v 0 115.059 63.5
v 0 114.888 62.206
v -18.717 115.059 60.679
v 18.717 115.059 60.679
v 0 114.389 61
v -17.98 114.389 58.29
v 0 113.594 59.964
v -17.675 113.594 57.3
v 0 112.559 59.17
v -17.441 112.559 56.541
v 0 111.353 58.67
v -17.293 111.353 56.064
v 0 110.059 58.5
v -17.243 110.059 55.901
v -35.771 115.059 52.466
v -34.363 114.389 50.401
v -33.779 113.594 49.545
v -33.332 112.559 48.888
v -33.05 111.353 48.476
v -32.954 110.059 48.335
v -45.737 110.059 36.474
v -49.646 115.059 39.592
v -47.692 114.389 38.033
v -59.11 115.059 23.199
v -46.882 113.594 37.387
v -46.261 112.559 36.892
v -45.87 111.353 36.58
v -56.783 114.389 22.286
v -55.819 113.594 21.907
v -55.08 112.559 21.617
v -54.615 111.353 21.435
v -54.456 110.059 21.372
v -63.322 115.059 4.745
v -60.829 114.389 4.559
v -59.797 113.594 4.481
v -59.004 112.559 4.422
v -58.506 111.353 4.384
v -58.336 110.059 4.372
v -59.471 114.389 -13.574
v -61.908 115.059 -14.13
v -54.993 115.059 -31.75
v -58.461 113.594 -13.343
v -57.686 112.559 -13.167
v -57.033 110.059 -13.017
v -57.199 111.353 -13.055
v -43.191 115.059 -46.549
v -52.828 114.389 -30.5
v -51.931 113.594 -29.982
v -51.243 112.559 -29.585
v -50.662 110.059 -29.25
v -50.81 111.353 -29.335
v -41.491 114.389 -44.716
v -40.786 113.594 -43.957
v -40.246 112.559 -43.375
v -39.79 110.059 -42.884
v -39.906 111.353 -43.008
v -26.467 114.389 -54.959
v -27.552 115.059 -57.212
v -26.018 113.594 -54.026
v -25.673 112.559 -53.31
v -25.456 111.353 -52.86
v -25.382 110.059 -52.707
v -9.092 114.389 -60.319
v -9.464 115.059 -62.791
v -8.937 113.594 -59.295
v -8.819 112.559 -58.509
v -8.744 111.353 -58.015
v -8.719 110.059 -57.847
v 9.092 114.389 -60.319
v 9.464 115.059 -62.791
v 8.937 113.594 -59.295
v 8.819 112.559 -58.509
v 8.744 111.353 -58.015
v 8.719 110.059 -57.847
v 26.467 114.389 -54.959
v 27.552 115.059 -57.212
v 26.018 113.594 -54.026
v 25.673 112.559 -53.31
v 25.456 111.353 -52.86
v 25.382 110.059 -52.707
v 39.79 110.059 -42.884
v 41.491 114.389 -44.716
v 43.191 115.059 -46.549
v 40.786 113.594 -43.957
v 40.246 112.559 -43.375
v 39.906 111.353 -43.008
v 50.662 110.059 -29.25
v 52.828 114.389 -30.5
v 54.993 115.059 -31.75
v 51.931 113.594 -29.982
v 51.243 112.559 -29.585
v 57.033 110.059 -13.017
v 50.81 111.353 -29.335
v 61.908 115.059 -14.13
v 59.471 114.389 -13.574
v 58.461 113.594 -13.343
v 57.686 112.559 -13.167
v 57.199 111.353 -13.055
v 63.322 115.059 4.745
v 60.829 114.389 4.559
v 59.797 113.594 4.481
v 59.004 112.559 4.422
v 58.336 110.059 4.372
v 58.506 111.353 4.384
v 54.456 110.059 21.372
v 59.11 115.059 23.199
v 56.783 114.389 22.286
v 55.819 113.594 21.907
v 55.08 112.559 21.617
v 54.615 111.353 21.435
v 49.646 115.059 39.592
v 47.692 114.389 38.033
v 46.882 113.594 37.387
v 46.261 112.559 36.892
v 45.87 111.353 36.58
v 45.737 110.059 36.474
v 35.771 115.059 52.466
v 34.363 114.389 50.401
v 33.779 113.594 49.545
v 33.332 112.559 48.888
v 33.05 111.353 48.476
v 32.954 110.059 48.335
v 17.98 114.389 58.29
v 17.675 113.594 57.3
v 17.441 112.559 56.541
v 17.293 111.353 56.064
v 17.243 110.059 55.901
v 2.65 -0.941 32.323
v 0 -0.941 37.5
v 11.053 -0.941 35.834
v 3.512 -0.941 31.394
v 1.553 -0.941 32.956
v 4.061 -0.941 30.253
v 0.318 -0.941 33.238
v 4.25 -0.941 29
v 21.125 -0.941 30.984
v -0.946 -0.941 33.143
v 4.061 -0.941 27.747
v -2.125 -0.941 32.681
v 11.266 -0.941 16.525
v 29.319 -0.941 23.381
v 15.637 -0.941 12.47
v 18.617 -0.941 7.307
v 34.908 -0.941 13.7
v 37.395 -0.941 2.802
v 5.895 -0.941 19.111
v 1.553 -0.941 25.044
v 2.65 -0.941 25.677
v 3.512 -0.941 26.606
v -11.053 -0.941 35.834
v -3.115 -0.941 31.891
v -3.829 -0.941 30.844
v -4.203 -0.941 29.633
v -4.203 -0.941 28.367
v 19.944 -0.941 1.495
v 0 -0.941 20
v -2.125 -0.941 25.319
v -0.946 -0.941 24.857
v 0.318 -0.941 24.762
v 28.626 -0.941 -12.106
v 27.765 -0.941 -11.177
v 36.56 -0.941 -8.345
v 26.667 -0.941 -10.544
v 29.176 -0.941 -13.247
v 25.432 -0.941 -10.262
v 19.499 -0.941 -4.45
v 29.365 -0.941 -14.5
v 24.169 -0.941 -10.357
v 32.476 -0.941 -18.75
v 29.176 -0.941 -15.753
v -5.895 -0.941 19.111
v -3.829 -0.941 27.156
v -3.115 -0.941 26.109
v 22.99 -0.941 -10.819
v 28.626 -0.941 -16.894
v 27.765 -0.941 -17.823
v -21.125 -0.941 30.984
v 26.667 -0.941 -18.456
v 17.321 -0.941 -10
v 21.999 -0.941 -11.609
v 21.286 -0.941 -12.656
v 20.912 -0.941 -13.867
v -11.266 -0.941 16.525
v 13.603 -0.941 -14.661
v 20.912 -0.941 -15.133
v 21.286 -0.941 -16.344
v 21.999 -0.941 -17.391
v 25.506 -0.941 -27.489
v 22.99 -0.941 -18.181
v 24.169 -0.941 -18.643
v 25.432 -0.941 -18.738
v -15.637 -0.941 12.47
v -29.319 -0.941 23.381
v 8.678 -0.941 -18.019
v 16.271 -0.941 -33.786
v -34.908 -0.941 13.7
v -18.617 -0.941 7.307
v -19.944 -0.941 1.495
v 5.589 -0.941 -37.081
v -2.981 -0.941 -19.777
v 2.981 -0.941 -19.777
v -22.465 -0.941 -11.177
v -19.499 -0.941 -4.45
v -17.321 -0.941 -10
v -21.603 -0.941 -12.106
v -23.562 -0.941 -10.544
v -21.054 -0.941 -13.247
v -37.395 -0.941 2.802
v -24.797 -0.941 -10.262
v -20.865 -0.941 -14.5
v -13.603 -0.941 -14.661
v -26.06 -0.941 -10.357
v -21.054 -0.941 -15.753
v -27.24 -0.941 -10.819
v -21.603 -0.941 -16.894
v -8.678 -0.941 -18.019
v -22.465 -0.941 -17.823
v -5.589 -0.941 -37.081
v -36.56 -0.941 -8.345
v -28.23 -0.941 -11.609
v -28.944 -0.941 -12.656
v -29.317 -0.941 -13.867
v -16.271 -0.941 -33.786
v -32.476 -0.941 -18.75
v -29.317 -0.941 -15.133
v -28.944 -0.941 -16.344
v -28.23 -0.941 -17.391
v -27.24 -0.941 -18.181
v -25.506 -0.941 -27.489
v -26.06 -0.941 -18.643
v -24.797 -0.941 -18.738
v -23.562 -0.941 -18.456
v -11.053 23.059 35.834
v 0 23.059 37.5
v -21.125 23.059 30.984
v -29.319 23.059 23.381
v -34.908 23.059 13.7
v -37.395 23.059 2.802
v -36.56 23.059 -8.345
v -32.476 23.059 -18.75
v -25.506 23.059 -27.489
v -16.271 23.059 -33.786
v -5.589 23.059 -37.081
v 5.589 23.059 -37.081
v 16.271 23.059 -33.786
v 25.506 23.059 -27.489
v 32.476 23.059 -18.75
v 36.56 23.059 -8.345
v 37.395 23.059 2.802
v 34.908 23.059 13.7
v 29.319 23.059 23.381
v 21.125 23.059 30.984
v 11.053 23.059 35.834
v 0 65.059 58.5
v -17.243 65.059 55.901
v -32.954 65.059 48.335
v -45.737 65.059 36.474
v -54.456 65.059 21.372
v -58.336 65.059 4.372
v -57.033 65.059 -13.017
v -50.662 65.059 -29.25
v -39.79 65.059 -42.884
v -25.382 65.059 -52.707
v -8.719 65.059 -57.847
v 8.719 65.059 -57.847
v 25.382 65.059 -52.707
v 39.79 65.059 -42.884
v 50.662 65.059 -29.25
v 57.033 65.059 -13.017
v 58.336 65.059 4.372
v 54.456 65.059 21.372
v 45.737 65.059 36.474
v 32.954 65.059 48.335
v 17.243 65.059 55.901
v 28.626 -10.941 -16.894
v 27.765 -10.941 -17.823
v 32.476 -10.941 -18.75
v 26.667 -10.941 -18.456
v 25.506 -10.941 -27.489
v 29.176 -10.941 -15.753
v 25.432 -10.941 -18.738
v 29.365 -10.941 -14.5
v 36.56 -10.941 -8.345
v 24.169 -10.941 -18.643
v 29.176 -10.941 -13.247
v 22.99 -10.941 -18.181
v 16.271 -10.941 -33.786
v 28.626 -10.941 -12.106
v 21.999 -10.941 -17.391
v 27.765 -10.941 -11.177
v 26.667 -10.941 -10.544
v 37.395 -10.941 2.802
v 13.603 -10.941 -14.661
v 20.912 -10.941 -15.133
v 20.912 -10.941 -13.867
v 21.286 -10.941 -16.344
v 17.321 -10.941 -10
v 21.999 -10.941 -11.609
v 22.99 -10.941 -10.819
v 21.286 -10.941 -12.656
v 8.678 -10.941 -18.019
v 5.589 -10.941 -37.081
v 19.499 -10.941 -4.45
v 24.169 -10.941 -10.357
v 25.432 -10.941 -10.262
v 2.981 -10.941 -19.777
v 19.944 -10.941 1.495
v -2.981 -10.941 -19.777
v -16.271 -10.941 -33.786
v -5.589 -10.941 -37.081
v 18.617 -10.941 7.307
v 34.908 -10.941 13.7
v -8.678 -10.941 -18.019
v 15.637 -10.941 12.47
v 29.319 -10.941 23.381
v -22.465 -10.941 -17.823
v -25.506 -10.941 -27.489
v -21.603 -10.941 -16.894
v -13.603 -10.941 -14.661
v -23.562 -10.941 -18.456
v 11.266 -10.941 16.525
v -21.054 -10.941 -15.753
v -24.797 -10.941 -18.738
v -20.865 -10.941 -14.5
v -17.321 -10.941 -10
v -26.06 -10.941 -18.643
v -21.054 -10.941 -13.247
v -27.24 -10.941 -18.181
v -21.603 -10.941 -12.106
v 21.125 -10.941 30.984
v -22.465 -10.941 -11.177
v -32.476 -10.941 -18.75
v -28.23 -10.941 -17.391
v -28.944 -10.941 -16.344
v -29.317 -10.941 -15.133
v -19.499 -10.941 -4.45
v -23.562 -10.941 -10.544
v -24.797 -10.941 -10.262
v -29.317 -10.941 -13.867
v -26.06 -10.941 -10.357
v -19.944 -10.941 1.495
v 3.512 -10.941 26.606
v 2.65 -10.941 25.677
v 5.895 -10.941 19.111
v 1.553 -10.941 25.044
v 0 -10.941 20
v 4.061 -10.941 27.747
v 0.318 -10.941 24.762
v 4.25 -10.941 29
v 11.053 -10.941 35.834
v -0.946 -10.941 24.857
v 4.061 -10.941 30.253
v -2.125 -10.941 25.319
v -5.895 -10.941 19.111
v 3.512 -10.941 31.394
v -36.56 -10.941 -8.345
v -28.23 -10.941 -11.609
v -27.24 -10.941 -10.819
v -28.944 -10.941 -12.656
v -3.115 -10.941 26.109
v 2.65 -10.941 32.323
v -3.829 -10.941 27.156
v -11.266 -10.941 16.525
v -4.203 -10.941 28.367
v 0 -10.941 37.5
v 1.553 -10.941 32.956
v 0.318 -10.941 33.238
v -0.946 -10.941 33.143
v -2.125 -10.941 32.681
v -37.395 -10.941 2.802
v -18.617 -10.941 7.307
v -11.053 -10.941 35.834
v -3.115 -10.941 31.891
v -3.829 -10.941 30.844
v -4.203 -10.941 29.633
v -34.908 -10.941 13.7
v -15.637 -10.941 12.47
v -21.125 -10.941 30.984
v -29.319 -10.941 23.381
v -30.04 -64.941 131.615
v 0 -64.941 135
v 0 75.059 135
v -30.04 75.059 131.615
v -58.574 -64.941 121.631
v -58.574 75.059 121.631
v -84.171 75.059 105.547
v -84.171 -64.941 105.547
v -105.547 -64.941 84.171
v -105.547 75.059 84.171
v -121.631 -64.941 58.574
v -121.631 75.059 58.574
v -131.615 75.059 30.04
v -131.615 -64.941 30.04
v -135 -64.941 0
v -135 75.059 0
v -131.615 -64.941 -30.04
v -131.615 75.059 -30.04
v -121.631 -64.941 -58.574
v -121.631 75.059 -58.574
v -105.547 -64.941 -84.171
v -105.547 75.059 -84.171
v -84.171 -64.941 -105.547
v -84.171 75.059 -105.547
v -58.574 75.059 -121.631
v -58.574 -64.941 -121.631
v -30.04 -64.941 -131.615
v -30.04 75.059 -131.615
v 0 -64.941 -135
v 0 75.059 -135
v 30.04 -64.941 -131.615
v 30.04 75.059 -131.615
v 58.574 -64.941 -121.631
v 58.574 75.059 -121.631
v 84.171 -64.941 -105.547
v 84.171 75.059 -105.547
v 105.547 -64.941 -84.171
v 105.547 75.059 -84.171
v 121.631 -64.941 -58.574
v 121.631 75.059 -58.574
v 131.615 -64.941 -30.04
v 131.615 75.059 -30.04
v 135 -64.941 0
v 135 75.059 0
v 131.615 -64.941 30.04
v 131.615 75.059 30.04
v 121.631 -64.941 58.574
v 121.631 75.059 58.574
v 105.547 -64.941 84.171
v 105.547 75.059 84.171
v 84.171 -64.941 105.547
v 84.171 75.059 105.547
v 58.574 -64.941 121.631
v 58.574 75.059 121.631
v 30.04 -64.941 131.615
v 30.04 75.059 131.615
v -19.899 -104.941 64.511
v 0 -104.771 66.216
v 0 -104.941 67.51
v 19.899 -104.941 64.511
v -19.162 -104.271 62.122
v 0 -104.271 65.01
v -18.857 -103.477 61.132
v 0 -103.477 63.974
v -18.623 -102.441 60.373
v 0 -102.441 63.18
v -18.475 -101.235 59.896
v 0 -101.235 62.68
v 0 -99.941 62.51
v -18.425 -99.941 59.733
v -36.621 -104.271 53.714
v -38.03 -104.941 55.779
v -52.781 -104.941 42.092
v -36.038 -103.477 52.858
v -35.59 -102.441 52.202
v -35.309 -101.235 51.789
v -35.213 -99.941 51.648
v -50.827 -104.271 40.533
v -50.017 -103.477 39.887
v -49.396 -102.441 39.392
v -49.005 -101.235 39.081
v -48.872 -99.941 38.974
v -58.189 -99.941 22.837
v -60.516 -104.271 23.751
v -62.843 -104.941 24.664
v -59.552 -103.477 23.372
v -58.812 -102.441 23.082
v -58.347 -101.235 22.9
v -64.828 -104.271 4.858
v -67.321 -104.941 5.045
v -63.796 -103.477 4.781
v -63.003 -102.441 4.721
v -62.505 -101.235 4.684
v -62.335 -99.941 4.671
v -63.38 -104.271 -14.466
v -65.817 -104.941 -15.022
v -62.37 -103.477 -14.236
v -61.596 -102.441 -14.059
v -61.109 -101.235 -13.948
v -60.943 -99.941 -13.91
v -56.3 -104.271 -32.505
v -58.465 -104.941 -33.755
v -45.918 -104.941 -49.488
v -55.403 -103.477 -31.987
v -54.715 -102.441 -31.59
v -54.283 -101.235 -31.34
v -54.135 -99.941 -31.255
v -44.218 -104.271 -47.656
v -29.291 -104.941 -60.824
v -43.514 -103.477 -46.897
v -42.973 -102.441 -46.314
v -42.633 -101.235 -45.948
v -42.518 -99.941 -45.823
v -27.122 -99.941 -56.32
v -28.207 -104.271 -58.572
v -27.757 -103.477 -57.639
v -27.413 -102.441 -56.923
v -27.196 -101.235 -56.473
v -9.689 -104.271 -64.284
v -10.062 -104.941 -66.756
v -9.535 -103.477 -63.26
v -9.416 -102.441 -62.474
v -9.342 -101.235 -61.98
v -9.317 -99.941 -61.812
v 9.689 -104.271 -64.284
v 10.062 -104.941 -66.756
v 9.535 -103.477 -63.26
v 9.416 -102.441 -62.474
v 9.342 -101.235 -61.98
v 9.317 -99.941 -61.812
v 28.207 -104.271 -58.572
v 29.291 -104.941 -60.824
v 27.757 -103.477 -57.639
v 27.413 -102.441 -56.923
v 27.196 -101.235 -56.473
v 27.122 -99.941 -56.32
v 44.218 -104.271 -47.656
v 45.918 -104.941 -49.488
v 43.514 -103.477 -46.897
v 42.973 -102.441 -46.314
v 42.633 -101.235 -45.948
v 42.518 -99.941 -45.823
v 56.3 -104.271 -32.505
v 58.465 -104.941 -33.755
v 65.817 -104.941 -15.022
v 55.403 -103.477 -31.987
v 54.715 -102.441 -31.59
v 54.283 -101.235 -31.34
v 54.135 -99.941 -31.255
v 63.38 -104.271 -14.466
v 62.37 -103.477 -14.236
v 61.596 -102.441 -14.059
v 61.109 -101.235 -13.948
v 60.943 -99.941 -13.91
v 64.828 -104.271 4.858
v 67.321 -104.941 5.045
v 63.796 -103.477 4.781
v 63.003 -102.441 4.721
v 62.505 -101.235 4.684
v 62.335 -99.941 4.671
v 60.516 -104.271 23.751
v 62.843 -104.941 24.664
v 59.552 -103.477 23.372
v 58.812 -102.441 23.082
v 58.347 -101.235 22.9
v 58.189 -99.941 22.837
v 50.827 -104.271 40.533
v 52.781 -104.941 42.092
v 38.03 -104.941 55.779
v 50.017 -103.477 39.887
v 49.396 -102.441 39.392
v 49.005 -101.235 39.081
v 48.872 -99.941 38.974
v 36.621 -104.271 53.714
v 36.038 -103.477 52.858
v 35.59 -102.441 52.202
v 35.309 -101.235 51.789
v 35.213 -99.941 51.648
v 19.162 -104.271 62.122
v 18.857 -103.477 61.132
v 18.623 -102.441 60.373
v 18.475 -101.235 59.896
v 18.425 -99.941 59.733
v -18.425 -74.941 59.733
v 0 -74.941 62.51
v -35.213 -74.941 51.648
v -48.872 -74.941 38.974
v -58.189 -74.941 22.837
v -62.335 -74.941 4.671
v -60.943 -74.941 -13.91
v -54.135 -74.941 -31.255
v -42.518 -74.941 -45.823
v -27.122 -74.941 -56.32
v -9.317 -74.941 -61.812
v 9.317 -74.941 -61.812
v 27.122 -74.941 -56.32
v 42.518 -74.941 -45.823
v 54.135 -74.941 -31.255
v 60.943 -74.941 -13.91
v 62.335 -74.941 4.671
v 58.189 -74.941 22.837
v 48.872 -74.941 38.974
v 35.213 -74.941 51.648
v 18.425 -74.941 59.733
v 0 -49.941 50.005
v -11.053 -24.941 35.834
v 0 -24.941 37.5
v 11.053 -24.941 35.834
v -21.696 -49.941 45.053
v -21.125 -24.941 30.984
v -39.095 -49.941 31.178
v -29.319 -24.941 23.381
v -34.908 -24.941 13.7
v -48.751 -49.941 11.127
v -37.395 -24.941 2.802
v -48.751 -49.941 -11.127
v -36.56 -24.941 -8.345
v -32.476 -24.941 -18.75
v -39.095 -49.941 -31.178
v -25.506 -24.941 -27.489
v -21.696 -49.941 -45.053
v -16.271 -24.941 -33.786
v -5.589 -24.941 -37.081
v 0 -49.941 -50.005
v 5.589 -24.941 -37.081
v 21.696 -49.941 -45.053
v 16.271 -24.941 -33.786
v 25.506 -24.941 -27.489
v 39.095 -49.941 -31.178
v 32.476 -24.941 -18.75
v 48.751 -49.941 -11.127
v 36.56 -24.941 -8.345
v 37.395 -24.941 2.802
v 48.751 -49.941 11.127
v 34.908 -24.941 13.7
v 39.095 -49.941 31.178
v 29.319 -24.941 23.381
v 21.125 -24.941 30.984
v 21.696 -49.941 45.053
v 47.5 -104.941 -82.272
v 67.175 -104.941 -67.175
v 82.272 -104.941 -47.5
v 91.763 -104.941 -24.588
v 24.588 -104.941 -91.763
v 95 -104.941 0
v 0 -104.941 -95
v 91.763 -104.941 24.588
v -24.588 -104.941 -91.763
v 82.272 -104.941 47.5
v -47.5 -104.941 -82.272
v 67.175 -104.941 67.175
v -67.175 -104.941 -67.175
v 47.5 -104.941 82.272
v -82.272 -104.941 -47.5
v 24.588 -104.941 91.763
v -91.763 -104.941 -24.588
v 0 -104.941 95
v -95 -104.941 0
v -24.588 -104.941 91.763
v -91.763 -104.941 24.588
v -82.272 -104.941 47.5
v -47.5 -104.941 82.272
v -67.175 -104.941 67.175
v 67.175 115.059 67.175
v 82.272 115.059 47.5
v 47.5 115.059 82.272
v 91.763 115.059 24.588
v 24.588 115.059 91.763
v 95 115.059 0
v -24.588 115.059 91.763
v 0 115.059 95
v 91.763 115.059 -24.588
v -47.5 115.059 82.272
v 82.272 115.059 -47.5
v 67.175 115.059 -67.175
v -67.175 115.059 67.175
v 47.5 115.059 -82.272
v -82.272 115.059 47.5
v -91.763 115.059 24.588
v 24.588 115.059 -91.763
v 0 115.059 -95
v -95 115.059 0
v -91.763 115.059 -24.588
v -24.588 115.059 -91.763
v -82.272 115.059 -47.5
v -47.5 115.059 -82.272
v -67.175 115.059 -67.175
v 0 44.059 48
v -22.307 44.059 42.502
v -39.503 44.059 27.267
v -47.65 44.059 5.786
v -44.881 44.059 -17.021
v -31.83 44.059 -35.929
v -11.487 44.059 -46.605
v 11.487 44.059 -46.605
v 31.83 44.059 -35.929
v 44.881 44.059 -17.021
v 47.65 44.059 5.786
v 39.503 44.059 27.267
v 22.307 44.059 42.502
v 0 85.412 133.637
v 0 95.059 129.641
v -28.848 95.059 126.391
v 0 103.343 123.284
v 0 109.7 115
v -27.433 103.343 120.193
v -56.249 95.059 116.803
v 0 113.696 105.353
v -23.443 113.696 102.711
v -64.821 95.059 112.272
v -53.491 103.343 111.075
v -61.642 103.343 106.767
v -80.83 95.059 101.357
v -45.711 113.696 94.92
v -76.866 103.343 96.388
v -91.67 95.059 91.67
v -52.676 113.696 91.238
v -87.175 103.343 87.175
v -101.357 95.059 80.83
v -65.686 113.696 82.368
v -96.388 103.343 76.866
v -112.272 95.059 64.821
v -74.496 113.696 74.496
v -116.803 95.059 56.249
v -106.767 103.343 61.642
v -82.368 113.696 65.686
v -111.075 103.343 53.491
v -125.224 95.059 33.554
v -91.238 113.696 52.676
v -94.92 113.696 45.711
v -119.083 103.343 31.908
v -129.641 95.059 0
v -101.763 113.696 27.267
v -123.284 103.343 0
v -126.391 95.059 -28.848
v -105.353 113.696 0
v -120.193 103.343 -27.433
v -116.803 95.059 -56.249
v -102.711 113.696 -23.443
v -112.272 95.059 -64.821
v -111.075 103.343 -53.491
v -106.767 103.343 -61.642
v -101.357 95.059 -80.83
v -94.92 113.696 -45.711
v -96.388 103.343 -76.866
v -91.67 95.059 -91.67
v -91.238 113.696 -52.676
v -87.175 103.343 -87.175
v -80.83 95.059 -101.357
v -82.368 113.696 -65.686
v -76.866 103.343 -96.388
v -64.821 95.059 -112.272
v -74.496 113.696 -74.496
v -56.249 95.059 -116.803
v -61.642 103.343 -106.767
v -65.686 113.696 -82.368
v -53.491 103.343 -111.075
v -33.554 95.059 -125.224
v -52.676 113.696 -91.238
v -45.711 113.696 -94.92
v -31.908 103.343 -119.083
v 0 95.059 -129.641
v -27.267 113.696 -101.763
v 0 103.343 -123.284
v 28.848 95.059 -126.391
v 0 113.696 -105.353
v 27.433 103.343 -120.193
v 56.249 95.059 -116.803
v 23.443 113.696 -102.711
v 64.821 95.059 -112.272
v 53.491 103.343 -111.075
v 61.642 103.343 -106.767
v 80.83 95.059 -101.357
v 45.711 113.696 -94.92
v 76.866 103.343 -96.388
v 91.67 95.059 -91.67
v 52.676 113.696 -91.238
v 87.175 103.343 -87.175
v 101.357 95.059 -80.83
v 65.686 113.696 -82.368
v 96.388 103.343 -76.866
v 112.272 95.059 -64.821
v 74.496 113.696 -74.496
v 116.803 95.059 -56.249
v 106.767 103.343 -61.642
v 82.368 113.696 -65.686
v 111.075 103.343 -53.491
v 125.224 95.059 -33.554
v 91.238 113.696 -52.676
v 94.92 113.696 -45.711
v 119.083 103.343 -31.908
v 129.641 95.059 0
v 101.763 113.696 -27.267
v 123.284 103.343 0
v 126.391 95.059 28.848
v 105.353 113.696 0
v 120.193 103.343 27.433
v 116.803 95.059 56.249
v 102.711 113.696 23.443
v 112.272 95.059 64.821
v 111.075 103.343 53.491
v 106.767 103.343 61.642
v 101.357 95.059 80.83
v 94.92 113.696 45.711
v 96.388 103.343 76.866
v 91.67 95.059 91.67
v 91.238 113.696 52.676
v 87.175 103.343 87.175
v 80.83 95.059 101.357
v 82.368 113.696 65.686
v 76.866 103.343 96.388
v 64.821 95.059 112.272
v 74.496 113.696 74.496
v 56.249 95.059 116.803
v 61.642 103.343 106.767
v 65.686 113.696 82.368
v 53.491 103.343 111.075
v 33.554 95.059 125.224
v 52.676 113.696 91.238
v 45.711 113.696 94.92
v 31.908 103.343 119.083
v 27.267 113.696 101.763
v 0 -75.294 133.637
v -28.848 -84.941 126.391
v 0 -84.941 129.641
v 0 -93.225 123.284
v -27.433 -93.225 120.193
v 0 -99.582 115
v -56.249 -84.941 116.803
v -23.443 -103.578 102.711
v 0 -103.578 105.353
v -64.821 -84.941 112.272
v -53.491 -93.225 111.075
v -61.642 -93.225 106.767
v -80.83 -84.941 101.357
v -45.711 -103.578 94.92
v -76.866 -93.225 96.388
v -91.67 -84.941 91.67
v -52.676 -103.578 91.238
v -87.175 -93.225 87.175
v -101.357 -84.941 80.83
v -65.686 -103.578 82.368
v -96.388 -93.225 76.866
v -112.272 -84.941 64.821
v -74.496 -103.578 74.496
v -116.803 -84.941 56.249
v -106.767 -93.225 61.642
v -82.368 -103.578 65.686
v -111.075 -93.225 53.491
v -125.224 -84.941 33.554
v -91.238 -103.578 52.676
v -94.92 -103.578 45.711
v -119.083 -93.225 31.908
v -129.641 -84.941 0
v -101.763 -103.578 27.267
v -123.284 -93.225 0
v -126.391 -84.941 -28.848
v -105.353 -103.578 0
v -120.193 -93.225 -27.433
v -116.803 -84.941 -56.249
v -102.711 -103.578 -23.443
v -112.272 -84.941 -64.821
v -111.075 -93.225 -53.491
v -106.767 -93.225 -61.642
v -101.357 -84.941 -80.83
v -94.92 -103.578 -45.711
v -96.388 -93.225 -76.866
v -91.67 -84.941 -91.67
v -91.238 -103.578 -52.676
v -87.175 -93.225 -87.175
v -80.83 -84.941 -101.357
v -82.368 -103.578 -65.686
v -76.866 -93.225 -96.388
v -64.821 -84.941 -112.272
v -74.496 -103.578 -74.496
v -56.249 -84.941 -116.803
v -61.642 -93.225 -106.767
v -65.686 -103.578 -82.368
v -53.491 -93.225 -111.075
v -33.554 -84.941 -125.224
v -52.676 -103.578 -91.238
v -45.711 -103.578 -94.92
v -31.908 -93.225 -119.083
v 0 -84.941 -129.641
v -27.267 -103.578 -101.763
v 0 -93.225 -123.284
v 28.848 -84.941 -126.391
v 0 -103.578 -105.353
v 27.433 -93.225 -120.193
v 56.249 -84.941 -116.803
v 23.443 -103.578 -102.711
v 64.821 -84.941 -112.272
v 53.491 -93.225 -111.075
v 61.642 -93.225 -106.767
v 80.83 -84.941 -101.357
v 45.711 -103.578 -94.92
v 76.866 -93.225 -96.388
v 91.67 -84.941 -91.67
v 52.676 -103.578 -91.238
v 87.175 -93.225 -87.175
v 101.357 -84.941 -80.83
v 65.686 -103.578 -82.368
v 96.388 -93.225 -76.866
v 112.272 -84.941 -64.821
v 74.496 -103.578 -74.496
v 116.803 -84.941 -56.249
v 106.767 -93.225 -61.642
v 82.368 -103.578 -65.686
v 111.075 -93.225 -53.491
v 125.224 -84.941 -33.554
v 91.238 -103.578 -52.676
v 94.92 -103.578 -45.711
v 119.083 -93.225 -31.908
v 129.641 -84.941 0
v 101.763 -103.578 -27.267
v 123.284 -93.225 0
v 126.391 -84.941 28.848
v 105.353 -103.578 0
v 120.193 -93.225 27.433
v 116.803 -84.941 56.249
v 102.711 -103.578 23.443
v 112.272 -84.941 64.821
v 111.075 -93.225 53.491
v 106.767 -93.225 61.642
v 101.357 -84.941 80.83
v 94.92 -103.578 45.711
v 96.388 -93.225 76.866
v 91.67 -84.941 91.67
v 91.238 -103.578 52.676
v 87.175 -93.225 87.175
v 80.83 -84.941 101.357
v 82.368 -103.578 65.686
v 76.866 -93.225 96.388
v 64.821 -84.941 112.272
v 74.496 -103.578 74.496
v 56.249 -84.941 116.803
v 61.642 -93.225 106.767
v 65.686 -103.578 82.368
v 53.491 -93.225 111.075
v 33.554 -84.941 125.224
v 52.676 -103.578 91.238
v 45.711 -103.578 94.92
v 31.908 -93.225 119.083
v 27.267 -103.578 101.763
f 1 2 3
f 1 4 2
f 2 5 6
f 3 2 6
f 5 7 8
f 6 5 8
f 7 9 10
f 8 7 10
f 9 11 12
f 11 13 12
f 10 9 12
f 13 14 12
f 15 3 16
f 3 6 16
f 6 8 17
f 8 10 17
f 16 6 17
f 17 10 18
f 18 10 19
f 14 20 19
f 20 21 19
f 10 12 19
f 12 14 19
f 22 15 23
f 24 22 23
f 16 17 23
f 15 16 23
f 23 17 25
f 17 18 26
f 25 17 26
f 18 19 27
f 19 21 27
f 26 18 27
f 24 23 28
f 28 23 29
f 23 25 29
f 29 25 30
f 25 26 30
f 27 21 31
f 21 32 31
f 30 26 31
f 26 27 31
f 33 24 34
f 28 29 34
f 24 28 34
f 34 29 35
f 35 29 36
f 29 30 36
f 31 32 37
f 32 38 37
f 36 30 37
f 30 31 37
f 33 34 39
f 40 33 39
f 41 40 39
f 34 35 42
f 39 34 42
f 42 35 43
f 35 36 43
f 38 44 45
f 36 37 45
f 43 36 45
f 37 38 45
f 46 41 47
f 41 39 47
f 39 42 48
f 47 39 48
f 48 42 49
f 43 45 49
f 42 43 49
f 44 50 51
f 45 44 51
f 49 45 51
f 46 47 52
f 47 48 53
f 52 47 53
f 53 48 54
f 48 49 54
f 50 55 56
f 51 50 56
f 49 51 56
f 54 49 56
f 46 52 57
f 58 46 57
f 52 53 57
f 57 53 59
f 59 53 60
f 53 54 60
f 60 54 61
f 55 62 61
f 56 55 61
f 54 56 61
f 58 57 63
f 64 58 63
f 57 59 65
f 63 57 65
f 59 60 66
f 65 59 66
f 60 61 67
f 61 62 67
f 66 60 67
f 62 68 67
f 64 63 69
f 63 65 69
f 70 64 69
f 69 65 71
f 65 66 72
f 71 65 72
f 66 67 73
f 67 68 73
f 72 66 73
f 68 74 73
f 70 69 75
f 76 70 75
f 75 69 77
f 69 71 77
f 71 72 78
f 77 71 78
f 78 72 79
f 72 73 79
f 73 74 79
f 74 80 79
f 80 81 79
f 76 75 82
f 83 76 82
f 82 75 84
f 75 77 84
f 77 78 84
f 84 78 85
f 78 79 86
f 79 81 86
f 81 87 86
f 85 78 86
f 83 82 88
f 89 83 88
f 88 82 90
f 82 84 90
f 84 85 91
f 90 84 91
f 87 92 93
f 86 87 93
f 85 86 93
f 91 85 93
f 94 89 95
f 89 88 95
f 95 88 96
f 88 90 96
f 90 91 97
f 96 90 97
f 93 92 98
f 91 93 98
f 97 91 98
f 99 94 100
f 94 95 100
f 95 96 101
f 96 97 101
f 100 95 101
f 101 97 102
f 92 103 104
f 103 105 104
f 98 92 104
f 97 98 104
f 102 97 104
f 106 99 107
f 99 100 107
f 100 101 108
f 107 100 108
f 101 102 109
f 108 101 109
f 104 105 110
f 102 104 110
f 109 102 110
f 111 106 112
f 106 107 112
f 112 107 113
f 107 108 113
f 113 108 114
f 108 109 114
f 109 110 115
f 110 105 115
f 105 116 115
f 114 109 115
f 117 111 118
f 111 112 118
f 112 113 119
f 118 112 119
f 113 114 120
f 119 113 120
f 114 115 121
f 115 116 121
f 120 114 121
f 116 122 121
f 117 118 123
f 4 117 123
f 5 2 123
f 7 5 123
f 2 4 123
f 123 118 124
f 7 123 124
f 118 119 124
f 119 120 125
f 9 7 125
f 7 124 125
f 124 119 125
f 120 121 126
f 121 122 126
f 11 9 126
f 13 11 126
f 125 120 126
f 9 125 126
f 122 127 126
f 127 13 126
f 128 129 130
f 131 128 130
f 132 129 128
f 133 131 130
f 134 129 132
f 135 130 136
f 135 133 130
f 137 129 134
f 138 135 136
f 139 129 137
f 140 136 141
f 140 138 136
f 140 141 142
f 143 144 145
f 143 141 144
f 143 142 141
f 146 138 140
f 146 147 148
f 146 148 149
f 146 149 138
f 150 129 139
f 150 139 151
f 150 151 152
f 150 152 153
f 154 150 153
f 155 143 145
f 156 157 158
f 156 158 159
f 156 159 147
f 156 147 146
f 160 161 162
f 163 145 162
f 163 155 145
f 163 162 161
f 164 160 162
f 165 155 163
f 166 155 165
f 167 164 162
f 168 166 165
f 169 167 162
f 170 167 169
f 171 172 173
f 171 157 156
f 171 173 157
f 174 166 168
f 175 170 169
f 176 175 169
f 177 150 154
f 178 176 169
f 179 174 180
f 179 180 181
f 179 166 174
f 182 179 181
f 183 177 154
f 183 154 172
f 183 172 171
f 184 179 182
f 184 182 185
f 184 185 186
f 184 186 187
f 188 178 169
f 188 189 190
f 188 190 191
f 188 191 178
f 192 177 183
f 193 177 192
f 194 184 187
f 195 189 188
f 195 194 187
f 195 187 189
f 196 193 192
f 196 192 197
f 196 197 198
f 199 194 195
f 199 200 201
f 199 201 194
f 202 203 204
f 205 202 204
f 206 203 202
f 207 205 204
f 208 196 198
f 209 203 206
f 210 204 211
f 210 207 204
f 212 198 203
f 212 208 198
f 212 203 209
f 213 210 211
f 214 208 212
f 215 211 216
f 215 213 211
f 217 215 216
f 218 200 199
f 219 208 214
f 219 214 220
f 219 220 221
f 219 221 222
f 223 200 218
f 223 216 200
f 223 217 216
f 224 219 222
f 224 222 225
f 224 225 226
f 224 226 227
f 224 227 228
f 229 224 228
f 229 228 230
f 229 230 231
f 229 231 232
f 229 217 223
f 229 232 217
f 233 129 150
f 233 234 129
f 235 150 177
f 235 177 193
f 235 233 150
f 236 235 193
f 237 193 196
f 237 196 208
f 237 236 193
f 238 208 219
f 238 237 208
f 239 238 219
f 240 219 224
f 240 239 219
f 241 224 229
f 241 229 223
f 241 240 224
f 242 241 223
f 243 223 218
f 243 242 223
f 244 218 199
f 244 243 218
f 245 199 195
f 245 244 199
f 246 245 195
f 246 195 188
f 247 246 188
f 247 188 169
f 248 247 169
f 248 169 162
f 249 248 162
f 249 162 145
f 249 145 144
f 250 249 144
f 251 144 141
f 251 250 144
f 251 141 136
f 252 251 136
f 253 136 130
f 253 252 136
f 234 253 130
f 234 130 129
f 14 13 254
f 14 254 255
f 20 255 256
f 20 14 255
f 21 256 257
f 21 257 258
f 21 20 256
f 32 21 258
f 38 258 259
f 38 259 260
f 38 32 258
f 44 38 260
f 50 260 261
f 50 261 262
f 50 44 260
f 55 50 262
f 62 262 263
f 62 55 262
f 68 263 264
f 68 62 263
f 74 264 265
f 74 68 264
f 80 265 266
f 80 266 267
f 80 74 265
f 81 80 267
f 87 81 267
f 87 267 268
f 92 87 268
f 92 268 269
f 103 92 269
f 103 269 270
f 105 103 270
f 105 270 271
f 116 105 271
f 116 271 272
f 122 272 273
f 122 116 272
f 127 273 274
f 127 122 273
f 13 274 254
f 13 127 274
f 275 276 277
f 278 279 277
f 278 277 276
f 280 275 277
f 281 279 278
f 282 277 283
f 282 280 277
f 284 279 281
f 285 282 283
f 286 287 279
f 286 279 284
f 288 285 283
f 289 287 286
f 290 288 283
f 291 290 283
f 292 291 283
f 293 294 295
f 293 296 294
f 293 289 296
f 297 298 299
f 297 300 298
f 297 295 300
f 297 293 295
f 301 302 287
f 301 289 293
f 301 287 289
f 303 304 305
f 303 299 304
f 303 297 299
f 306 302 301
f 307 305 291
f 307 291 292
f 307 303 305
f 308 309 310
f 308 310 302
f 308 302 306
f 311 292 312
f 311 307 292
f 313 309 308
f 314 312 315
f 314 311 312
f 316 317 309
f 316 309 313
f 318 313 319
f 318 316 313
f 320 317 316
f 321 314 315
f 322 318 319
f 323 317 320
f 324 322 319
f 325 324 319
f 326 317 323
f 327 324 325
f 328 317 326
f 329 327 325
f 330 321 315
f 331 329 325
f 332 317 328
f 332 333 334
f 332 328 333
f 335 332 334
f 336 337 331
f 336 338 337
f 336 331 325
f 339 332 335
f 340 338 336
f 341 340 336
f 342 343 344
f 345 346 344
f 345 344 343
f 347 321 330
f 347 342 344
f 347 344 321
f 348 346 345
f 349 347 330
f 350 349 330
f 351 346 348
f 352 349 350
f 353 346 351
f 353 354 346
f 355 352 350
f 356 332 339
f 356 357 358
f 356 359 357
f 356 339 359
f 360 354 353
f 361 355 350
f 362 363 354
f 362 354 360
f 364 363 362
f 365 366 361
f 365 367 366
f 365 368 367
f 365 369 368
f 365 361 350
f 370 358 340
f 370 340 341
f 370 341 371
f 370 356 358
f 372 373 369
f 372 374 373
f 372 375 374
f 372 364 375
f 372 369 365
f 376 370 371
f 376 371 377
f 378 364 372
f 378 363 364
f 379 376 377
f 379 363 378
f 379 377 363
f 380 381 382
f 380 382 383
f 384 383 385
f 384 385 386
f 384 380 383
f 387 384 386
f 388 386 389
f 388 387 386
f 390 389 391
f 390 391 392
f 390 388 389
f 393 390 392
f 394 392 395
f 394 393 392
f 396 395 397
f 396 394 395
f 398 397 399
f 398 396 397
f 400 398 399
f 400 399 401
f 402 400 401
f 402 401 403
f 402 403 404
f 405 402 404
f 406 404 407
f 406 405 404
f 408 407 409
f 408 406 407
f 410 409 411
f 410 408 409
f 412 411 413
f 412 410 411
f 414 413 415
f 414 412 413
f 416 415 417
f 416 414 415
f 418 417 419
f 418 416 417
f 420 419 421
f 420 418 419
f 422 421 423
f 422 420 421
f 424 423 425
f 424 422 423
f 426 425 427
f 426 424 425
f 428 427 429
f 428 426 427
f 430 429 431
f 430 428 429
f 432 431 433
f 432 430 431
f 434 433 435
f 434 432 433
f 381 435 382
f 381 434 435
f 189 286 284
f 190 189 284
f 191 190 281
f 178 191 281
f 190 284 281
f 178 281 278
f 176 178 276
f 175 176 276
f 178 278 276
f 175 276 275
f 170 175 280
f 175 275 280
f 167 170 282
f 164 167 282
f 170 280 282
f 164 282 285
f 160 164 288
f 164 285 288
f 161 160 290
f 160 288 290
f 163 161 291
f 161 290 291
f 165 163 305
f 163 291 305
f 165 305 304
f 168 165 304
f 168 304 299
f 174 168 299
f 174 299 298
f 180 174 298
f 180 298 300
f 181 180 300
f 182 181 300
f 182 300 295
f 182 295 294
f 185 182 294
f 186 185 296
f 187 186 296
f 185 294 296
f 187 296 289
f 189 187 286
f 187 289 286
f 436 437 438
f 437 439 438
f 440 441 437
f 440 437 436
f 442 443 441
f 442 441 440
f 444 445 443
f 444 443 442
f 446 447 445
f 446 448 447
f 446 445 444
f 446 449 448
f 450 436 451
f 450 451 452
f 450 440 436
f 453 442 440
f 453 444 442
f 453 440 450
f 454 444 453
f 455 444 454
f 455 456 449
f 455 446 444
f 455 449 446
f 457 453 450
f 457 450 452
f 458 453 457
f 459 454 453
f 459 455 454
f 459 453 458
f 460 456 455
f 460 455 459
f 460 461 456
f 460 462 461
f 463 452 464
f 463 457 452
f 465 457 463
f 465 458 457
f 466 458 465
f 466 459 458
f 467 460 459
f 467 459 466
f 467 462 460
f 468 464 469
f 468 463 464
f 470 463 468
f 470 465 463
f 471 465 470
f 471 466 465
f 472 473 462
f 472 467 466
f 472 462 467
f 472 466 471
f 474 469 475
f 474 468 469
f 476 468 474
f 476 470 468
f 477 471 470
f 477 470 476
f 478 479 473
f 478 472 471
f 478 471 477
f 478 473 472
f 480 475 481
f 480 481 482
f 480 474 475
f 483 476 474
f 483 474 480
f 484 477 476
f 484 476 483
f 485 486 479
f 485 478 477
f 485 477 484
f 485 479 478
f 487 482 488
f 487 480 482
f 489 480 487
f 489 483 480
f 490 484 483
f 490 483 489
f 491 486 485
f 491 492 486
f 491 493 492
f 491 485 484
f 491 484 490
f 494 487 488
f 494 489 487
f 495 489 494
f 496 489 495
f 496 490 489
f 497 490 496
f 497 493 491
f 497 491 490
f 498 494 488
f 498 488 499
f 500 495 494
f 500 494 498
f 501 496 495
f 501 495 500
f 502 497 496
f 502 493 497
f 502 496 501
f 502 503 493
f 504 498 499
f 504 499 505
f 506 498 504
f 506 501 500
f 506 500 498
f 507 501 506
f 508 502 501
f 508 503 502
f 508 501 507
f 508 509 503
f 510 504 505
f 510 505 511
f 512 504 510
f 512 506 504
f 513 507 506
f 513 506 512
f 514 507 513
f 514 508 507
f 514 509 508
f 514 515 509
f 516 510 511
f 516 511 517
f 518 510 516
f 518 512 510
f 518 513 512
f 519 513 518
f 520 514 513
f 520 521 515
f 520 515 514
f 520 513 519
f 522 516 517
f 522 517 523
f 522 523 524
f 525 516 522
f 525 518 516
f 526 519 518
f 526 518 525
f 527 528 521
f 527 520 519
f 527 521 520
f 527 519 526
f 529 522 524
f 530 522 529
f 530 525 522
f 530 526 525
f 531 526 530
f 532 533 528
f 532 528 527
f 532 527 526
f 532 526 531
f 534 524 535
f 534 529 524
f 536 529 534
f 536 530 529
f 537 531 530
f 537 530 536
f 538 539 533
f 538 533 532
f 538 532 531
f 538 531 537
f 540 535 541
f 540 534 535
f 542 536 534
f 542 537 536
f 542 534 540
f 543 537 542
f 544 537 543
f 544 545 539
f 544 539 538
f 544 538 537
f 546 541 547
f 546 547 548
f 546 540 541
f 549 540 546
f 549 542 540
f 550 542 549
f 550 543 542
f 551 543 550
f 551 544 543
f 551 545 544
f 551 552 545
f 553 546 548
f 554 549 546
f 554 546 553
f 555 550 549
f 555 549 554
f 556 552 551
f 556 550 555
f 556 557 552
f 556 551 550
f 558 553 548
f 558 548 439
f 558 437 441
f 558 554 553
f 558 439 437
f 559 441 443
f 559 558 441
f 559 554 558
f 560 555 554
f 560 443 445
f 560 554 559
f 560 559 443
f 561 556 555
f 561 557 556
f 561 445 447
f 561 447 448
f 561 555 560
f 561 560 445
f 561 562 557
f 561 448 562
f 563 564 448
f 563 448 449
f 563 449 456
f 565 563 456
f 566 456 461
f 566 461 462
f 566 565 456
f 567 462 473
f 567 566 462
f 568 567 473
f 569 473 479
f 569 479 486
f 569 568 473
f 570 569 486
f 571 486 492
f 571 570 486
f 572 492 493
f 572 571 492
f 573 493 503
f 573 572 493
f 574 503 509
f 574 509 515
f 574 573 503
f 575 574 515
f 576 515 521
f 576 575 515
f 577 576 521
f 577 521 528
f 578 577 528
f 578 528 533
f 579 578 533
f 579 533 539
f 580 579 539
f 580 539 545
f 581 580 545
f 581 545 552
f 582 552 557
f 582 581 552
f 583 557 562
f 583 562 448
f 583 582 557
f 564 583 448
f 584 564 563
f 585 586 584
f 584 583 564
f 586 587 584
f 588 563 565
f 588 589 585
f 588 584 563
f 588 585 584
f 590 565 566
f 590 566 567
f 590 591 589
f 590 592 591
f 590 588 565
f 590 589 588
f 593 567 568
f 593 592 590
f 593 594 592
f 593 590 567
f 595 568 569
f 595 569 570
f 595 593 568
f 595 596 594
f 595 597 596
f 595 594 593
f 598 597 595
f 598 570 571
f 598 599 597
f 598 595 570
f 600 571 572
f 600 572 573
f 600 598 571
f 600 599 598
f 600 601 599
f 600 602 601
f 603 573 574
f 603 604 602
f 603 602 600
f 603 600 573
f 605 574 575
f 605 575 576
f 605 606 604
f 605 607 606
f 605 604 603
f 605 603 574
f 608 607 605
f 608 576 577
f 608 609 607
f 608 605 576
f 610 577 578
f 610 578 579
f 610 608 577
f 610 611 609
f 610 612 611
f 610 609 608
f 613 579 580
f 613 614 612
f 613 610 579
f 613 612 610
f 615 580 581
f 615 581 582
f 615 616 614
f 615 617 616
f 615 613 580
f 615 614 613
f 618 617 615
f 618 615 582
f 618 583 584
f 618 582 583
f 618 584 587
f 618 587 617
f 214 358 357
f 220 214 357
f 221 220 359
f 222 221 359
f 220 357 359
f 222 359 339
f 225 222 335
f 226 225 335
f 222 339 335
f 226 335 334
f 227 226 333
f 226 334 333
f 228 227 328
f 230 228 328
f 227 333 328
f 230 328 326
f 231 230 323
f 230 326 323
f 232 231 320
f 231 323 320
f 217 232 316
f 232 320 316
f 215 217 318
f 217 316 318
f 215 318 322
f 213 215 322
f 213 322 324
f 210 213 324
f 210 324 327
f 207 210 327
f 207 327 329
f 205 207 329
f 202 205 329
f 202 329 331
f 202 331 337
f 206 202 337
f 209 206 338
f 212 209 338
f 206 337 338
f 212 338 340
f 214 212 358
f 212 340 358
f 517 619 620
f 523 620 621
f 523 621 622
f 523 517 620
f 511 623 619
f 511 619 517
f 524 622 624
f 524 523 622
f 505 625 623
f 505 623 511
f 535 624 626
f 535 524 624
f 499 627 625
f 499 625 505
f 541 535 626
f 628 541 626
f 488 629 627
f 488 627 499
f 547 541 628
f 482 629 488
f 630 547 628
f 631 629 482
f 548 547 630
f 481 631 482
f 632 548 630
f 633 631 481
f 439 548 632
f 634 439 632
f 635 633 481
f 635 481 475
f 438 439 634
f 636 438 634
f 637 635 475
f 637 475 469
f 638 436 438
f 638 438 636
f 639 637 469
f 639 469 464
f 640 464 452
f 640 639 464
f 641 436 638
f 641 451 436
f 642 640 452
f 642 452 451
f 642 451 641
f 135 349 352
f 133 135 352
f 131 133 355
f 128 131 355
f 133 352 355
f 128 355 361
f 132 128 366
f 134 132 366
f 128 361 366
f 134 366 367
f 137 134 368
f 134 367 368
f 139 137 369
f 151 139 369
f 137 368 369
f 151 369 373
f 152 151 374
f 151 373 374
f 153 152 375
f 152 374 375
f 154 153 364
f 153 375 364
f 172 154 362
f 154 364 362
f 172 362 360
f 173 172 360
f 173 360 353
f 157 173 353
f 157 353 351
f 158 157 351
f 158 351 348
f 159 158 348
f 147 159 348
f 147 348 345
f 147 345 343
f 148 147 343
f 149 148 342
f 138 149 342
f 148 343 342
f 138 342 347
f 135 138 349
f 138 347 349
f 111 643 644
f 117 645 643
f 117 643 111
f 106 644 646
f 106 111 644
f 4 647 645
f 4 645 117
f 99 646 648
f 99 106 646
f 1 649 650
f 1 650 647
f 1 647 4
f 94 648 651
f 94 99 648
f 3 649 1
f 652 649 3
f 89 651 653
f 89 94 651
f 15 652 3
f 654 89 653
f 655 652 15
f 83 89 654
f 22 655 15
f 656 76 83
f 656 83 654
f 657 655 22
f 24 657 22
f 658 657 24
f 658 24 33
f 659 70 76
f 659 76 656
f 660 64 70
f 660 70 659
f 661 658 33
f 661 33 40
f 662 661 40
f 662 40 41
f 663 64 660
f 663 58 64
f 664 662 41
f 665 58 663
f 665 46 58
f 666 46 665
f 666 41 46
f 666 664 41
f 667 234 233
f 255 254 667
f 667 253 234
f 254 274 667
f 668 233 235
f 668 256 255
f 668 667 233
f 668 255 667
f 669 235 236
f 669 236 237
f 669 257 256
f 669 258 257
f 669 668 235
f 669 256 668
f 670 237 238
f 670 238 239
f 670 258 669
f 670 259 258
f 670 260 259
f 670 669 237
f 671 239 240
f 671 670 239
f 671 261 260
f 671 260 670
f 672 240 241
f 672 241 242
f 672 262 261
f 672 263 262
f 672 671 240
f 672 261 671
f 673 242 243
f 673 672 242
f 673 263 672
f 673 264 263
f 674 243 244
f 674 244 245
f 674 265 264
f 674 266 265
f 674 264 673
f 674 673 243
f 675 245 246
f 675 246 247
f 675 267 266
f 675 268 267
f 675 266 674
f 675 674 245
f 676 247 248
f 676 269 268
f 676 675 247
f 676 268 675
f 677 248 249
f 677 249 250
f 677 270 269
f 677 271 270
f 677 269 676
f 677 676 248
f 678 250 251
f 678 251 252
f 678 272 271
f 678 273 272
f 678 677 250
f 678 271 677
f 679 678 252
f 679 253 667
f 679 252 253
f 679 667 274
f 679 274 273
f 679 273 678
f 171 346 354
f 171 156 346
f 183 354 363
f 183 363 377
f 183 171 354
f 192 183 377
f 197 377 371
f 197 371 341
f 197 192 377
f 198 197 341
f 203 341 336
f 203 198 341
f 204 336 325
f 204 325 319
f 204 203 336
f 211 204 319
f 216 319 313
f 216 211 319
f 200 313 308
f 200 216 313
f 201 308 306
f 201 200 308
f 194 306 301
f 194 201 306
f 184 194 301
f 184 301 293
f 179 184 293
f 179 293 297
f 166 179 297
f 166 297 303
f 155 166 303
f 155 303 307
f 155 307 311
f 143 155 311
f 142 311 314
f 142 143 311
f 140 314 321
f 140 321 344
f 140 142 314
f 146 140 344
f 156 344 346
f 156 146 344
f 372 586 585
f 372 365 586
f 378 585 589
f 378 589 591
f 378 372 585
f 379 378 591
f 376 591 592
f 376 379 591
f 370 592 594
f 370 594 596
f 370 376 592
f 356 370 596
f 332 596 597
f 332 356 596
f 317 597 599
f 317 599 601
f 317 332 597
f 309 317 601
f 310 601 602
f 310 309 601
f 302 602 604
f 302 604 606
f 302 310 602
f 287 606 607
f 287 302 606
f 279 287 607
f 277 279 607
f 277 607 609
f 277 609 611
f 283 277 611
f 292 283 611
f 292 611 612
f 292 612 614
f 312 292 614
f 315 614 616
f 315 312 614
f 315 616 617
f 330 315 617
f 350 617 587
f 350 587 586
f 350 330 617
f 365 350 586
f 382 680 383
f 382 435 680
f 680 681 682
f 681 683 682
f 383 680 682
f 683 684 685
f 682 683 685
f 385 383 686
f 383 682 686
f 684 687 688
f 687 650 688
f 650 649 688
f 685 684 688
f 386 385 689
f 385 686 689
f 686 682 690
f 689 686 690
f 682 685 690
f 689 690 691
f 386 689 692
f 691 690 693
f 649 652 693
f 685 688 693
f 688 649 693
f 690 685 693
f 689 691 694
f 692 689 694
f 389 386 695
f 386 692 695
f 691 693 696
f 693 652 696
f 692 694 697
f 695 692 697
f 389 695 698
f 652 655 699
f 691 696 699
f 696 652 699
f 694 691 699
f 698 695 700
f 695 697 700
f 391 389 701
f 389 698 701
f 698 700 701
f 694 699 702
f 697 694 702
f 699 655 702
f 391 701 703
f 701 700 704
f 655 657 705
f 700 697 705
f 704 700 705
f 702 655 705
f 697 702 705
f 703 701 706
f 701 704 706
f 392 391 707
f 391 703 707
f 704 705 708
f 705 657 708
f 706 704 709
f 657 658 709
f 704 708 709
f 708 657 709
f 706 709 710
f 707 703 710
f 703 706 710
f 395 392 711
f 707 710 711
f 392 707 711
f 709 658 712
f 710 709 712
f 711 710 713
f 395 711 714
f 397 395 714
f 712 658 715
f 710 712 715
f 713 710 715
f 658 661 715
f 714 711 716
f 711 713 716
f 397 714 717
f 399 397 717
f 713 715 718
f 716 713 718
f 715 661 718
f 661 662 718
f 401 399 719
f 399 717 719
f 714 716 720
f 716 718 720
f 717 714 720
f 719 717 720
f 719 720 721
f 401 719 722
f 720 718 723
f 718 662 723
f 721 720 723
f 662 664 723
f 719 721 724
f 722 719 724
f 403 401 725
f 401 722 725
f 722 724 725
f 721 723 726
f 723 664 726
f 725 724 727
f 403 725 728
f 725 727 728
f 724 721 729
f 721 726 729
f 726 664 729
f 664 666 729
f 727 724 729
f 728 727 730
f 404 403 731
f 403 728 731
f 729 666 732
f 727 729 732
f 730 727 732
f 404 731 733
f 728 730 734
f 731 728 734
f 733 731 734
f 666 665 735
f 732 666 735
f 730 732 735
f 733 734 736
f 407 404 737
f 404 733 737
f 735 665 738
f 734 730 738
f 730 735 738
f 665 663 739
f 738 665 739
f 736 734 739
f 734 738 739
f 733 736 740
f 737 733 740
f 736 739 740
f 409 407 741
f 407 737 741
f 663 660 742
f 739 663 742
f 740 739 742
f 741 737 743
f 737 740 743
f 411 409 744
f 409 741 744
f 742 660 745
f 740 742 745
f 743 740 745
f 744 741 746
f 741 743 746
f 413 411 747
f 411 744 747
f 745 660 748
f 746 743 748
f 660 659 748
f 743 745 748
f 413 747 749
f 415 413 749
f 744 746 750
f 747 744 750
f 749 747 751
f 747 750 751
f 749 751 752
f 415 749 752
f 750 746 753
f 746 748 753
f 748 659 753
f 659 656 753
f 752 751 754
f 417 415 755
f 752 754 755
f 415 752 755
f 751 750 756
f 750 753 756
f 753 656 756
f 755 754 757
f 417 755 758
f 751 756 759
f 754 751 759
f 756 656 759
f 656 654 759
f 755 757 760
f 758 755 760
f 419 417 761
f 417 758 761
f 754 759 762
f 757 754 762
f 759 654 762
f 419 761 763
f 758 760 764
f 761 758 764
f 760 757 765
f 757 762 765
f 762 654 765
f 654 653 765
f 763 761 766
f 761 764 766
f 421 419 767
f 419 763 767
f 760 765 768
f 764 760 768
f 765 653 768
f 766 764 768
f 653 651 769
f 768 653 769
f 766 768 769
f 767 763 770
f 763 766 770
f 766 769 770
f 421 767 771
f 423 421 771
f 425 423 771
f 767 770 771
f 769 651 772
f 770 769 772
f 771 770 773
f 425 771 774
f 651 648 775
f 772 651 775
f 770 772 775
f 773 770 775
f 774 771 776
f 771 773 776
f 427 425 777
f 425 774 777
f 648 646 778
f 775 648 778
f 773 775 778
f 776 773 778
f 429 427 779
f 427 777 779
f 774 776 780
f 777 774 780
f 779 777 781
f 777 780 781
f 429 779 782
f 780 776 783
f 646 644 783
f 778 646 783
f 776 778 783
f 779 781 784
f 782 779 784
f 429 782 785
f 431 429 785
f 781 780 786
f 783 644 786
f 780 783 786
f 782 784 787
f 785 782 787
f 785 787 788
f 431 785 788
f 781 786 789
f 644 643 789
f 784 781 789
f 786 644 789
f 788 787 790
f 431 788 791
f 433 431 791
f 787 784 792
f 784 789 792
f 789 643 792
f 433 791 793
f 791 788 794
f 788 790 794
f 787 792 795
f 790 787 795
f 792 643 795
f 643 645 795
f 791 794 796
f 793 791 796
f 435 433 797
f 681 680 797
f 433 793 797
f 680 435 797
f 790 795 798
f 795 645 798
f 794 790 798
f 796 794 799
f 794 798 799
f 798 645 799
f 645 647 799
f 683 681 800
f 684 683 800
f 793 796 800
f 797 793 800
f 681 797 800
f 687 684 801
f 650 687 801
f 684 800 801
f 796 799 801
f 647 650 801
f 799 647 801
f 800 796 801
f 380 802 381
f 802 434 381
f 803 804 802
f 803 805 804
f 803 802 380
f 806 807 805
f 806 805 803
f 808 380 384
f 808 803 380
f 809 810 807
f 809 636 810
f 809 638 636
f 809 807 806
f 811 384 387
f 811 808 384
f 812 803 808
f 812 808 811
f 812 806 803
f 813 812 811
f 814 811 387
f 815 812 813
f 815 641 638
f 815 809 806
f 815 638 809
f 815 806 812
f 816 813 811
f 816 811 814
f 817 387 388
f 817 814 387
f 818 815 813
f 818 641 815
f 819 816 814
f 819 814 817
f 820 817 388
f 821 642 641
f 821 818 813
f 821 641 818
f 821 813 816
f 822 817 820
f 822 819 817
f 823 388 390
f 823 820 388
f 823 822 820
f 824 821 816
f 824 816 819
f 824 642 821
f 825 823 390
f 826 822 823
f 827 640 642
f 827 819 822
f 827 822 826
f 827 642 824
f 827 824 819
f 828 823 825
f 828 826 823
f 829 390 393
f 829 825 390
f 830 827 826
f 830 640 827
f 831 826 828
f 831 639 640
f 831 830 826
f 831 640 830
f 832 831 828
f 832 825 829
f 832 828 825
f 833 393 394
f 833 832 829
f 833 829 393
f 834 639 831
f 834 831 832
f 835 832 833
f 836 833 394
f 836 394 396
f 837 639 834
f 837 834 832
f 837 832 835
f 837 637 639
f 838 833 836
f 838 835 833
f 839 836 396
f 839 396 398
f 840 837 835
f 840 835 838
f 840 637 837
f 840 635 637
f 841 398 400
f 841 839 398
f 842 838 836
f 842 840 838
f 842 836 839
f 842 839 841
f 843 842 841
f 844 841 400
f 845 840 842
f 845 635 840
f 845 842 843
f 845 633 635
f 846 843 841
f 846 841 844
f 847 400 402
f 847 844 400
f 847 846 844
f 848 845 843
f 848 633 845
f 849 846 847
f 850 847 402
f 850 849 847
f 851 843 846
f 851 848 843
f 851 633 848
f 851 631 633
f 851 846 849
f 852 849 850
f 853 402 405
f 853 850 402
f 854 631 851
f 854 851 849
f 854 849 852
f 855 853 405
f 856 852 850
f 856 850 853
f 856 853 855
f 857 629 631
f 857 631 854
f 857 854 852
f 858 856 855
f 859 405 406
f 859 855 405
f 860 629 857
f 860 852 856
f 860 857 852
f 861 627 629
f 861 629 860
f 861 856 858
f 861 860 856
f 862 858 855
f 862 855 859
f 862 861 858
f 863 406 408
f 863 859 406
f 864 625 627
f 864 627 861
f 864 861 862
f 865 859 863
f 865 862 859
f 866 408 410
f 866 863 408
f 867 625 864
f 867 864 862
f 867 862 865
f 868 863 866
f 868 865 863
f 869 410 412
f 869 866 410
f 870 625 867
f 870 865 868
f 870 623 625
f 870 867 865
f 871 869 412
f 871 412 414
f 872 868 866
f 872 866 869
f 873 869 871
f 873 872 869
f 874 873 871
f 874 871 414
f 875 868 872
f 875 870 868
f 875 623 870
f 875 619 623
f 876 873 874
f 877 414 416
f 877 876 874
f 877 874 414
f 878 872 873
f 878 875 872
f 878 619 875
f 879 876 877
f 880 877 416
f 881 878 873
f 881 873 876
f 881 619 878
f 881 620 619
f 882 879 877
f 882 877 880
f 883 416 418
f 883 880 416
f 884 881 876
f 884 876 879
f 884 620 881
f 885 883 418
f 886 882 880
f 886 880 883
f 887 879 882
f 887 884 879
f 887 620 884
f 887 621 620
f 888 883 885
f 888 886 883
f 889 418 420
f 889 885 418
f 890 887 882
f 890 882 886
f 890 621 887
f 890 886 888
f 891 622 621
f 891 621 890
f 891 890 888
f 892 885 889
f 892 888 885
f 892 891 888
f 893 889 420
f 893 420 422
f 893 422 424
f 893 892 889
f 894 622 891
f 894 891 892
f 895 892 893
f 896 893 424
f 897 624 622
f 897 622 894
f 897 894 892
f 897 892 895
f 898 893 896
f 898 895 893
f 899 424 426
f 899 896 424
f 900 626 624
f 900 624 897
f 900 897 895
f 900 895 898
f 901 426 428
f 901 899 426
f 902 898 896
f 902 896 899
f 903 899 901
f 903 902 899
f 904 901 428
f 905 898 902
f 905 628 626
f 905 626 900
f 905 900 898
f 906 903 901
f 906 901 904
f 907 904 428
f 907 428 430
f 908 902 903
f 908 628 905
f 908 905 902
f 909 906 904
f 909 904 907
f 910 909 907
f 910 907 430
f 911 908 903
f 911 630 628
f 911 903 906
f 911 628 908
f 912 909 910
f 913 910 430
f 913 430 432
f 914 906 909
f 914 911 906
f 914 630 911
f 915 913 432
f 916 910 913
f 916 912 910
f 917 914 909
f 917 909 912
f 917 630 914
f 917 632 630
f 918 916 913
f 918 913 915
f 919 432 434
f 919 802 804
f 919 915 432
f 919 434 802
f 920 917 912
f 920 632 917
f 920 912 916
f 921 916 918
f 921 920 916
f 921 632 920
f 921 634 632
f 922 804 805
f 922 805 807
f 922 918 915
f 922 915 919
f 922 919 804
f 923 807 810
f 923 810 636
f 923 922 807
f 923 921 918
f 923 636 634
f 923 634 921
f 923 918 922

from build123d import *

# Parameters (mm, degrees)
F2_R     = 40
F3_R     = 5
F4_R     = 5
F5_R     = 4.25
F6_DEPTH = 10
F7_COUNT = 3


# Not quite as in the source:
# - a feature names something its author has since deleted; it is built from what else it names


with BuildPart() as f1:
    # F0 (on Right) → F1 (revolve)
    with BuildSketch(Plane.YZ):
        Polygon((115.0588170719, 135), (-104.9411829281, 135), (-104.9411829281, 62.5099688768), (-74.9411829281, 62.5099688768), (-24.9411829281, 37.5), (-10.9411829281, 37.5), (-10.9411829281, 20), (-0.9411829281, 20), (-0.9411829281, 37.5), (23.0588170719, 37.5), (65.0588170719, 58.5), (115.0588170719, 58.5), align=None)
    revolve(axis=Axis((0, 3.7167160804, 0), (0, -1, 0)))

    # F2
    f2_edges = [f1.edges().sort_by_distance(p)[0] for p in [
        (0, -104.941183, -135),
        (0, 115.058817, -135),
    ]]
    fillet(f2_edges, radius=F2_R)

    # F3
    f3_edges = [f1.edges().sort_by_distance(p)[0] for p in [
        (0, -104.941183, -62.509969),
    ]]
    fillet(f3_edges, radius=F3_R)

    # F4
    f4_edges = [f1.edges().sort_by_distance(p)[0] for p in [
        (0, 115.058817, -58.5),
    ]]
    fillet(f4_edges, radius=F4_R)

    # F5 (on face) → F6 (cut, through all)
    with BuildSketch(Plane.XZ.offset(10.9411829281)):
        with Locations((0, 29)):
            Circle(F5_R)
    f6 = extrude(amount=-F6_DEPTH, mode=Mode.SUBTRACT)

    # F7: F6 ×3 about axis
    f7_axis = Axis((0, 3.7167160804, 0), (0, -1, 0))
    for i in range(1, F7_COUNT):
        add(f6.rotate(f7_axis, i * 360 / F7_COUNT), mode=Mode.SUBTRACT)


solid = f1.part
